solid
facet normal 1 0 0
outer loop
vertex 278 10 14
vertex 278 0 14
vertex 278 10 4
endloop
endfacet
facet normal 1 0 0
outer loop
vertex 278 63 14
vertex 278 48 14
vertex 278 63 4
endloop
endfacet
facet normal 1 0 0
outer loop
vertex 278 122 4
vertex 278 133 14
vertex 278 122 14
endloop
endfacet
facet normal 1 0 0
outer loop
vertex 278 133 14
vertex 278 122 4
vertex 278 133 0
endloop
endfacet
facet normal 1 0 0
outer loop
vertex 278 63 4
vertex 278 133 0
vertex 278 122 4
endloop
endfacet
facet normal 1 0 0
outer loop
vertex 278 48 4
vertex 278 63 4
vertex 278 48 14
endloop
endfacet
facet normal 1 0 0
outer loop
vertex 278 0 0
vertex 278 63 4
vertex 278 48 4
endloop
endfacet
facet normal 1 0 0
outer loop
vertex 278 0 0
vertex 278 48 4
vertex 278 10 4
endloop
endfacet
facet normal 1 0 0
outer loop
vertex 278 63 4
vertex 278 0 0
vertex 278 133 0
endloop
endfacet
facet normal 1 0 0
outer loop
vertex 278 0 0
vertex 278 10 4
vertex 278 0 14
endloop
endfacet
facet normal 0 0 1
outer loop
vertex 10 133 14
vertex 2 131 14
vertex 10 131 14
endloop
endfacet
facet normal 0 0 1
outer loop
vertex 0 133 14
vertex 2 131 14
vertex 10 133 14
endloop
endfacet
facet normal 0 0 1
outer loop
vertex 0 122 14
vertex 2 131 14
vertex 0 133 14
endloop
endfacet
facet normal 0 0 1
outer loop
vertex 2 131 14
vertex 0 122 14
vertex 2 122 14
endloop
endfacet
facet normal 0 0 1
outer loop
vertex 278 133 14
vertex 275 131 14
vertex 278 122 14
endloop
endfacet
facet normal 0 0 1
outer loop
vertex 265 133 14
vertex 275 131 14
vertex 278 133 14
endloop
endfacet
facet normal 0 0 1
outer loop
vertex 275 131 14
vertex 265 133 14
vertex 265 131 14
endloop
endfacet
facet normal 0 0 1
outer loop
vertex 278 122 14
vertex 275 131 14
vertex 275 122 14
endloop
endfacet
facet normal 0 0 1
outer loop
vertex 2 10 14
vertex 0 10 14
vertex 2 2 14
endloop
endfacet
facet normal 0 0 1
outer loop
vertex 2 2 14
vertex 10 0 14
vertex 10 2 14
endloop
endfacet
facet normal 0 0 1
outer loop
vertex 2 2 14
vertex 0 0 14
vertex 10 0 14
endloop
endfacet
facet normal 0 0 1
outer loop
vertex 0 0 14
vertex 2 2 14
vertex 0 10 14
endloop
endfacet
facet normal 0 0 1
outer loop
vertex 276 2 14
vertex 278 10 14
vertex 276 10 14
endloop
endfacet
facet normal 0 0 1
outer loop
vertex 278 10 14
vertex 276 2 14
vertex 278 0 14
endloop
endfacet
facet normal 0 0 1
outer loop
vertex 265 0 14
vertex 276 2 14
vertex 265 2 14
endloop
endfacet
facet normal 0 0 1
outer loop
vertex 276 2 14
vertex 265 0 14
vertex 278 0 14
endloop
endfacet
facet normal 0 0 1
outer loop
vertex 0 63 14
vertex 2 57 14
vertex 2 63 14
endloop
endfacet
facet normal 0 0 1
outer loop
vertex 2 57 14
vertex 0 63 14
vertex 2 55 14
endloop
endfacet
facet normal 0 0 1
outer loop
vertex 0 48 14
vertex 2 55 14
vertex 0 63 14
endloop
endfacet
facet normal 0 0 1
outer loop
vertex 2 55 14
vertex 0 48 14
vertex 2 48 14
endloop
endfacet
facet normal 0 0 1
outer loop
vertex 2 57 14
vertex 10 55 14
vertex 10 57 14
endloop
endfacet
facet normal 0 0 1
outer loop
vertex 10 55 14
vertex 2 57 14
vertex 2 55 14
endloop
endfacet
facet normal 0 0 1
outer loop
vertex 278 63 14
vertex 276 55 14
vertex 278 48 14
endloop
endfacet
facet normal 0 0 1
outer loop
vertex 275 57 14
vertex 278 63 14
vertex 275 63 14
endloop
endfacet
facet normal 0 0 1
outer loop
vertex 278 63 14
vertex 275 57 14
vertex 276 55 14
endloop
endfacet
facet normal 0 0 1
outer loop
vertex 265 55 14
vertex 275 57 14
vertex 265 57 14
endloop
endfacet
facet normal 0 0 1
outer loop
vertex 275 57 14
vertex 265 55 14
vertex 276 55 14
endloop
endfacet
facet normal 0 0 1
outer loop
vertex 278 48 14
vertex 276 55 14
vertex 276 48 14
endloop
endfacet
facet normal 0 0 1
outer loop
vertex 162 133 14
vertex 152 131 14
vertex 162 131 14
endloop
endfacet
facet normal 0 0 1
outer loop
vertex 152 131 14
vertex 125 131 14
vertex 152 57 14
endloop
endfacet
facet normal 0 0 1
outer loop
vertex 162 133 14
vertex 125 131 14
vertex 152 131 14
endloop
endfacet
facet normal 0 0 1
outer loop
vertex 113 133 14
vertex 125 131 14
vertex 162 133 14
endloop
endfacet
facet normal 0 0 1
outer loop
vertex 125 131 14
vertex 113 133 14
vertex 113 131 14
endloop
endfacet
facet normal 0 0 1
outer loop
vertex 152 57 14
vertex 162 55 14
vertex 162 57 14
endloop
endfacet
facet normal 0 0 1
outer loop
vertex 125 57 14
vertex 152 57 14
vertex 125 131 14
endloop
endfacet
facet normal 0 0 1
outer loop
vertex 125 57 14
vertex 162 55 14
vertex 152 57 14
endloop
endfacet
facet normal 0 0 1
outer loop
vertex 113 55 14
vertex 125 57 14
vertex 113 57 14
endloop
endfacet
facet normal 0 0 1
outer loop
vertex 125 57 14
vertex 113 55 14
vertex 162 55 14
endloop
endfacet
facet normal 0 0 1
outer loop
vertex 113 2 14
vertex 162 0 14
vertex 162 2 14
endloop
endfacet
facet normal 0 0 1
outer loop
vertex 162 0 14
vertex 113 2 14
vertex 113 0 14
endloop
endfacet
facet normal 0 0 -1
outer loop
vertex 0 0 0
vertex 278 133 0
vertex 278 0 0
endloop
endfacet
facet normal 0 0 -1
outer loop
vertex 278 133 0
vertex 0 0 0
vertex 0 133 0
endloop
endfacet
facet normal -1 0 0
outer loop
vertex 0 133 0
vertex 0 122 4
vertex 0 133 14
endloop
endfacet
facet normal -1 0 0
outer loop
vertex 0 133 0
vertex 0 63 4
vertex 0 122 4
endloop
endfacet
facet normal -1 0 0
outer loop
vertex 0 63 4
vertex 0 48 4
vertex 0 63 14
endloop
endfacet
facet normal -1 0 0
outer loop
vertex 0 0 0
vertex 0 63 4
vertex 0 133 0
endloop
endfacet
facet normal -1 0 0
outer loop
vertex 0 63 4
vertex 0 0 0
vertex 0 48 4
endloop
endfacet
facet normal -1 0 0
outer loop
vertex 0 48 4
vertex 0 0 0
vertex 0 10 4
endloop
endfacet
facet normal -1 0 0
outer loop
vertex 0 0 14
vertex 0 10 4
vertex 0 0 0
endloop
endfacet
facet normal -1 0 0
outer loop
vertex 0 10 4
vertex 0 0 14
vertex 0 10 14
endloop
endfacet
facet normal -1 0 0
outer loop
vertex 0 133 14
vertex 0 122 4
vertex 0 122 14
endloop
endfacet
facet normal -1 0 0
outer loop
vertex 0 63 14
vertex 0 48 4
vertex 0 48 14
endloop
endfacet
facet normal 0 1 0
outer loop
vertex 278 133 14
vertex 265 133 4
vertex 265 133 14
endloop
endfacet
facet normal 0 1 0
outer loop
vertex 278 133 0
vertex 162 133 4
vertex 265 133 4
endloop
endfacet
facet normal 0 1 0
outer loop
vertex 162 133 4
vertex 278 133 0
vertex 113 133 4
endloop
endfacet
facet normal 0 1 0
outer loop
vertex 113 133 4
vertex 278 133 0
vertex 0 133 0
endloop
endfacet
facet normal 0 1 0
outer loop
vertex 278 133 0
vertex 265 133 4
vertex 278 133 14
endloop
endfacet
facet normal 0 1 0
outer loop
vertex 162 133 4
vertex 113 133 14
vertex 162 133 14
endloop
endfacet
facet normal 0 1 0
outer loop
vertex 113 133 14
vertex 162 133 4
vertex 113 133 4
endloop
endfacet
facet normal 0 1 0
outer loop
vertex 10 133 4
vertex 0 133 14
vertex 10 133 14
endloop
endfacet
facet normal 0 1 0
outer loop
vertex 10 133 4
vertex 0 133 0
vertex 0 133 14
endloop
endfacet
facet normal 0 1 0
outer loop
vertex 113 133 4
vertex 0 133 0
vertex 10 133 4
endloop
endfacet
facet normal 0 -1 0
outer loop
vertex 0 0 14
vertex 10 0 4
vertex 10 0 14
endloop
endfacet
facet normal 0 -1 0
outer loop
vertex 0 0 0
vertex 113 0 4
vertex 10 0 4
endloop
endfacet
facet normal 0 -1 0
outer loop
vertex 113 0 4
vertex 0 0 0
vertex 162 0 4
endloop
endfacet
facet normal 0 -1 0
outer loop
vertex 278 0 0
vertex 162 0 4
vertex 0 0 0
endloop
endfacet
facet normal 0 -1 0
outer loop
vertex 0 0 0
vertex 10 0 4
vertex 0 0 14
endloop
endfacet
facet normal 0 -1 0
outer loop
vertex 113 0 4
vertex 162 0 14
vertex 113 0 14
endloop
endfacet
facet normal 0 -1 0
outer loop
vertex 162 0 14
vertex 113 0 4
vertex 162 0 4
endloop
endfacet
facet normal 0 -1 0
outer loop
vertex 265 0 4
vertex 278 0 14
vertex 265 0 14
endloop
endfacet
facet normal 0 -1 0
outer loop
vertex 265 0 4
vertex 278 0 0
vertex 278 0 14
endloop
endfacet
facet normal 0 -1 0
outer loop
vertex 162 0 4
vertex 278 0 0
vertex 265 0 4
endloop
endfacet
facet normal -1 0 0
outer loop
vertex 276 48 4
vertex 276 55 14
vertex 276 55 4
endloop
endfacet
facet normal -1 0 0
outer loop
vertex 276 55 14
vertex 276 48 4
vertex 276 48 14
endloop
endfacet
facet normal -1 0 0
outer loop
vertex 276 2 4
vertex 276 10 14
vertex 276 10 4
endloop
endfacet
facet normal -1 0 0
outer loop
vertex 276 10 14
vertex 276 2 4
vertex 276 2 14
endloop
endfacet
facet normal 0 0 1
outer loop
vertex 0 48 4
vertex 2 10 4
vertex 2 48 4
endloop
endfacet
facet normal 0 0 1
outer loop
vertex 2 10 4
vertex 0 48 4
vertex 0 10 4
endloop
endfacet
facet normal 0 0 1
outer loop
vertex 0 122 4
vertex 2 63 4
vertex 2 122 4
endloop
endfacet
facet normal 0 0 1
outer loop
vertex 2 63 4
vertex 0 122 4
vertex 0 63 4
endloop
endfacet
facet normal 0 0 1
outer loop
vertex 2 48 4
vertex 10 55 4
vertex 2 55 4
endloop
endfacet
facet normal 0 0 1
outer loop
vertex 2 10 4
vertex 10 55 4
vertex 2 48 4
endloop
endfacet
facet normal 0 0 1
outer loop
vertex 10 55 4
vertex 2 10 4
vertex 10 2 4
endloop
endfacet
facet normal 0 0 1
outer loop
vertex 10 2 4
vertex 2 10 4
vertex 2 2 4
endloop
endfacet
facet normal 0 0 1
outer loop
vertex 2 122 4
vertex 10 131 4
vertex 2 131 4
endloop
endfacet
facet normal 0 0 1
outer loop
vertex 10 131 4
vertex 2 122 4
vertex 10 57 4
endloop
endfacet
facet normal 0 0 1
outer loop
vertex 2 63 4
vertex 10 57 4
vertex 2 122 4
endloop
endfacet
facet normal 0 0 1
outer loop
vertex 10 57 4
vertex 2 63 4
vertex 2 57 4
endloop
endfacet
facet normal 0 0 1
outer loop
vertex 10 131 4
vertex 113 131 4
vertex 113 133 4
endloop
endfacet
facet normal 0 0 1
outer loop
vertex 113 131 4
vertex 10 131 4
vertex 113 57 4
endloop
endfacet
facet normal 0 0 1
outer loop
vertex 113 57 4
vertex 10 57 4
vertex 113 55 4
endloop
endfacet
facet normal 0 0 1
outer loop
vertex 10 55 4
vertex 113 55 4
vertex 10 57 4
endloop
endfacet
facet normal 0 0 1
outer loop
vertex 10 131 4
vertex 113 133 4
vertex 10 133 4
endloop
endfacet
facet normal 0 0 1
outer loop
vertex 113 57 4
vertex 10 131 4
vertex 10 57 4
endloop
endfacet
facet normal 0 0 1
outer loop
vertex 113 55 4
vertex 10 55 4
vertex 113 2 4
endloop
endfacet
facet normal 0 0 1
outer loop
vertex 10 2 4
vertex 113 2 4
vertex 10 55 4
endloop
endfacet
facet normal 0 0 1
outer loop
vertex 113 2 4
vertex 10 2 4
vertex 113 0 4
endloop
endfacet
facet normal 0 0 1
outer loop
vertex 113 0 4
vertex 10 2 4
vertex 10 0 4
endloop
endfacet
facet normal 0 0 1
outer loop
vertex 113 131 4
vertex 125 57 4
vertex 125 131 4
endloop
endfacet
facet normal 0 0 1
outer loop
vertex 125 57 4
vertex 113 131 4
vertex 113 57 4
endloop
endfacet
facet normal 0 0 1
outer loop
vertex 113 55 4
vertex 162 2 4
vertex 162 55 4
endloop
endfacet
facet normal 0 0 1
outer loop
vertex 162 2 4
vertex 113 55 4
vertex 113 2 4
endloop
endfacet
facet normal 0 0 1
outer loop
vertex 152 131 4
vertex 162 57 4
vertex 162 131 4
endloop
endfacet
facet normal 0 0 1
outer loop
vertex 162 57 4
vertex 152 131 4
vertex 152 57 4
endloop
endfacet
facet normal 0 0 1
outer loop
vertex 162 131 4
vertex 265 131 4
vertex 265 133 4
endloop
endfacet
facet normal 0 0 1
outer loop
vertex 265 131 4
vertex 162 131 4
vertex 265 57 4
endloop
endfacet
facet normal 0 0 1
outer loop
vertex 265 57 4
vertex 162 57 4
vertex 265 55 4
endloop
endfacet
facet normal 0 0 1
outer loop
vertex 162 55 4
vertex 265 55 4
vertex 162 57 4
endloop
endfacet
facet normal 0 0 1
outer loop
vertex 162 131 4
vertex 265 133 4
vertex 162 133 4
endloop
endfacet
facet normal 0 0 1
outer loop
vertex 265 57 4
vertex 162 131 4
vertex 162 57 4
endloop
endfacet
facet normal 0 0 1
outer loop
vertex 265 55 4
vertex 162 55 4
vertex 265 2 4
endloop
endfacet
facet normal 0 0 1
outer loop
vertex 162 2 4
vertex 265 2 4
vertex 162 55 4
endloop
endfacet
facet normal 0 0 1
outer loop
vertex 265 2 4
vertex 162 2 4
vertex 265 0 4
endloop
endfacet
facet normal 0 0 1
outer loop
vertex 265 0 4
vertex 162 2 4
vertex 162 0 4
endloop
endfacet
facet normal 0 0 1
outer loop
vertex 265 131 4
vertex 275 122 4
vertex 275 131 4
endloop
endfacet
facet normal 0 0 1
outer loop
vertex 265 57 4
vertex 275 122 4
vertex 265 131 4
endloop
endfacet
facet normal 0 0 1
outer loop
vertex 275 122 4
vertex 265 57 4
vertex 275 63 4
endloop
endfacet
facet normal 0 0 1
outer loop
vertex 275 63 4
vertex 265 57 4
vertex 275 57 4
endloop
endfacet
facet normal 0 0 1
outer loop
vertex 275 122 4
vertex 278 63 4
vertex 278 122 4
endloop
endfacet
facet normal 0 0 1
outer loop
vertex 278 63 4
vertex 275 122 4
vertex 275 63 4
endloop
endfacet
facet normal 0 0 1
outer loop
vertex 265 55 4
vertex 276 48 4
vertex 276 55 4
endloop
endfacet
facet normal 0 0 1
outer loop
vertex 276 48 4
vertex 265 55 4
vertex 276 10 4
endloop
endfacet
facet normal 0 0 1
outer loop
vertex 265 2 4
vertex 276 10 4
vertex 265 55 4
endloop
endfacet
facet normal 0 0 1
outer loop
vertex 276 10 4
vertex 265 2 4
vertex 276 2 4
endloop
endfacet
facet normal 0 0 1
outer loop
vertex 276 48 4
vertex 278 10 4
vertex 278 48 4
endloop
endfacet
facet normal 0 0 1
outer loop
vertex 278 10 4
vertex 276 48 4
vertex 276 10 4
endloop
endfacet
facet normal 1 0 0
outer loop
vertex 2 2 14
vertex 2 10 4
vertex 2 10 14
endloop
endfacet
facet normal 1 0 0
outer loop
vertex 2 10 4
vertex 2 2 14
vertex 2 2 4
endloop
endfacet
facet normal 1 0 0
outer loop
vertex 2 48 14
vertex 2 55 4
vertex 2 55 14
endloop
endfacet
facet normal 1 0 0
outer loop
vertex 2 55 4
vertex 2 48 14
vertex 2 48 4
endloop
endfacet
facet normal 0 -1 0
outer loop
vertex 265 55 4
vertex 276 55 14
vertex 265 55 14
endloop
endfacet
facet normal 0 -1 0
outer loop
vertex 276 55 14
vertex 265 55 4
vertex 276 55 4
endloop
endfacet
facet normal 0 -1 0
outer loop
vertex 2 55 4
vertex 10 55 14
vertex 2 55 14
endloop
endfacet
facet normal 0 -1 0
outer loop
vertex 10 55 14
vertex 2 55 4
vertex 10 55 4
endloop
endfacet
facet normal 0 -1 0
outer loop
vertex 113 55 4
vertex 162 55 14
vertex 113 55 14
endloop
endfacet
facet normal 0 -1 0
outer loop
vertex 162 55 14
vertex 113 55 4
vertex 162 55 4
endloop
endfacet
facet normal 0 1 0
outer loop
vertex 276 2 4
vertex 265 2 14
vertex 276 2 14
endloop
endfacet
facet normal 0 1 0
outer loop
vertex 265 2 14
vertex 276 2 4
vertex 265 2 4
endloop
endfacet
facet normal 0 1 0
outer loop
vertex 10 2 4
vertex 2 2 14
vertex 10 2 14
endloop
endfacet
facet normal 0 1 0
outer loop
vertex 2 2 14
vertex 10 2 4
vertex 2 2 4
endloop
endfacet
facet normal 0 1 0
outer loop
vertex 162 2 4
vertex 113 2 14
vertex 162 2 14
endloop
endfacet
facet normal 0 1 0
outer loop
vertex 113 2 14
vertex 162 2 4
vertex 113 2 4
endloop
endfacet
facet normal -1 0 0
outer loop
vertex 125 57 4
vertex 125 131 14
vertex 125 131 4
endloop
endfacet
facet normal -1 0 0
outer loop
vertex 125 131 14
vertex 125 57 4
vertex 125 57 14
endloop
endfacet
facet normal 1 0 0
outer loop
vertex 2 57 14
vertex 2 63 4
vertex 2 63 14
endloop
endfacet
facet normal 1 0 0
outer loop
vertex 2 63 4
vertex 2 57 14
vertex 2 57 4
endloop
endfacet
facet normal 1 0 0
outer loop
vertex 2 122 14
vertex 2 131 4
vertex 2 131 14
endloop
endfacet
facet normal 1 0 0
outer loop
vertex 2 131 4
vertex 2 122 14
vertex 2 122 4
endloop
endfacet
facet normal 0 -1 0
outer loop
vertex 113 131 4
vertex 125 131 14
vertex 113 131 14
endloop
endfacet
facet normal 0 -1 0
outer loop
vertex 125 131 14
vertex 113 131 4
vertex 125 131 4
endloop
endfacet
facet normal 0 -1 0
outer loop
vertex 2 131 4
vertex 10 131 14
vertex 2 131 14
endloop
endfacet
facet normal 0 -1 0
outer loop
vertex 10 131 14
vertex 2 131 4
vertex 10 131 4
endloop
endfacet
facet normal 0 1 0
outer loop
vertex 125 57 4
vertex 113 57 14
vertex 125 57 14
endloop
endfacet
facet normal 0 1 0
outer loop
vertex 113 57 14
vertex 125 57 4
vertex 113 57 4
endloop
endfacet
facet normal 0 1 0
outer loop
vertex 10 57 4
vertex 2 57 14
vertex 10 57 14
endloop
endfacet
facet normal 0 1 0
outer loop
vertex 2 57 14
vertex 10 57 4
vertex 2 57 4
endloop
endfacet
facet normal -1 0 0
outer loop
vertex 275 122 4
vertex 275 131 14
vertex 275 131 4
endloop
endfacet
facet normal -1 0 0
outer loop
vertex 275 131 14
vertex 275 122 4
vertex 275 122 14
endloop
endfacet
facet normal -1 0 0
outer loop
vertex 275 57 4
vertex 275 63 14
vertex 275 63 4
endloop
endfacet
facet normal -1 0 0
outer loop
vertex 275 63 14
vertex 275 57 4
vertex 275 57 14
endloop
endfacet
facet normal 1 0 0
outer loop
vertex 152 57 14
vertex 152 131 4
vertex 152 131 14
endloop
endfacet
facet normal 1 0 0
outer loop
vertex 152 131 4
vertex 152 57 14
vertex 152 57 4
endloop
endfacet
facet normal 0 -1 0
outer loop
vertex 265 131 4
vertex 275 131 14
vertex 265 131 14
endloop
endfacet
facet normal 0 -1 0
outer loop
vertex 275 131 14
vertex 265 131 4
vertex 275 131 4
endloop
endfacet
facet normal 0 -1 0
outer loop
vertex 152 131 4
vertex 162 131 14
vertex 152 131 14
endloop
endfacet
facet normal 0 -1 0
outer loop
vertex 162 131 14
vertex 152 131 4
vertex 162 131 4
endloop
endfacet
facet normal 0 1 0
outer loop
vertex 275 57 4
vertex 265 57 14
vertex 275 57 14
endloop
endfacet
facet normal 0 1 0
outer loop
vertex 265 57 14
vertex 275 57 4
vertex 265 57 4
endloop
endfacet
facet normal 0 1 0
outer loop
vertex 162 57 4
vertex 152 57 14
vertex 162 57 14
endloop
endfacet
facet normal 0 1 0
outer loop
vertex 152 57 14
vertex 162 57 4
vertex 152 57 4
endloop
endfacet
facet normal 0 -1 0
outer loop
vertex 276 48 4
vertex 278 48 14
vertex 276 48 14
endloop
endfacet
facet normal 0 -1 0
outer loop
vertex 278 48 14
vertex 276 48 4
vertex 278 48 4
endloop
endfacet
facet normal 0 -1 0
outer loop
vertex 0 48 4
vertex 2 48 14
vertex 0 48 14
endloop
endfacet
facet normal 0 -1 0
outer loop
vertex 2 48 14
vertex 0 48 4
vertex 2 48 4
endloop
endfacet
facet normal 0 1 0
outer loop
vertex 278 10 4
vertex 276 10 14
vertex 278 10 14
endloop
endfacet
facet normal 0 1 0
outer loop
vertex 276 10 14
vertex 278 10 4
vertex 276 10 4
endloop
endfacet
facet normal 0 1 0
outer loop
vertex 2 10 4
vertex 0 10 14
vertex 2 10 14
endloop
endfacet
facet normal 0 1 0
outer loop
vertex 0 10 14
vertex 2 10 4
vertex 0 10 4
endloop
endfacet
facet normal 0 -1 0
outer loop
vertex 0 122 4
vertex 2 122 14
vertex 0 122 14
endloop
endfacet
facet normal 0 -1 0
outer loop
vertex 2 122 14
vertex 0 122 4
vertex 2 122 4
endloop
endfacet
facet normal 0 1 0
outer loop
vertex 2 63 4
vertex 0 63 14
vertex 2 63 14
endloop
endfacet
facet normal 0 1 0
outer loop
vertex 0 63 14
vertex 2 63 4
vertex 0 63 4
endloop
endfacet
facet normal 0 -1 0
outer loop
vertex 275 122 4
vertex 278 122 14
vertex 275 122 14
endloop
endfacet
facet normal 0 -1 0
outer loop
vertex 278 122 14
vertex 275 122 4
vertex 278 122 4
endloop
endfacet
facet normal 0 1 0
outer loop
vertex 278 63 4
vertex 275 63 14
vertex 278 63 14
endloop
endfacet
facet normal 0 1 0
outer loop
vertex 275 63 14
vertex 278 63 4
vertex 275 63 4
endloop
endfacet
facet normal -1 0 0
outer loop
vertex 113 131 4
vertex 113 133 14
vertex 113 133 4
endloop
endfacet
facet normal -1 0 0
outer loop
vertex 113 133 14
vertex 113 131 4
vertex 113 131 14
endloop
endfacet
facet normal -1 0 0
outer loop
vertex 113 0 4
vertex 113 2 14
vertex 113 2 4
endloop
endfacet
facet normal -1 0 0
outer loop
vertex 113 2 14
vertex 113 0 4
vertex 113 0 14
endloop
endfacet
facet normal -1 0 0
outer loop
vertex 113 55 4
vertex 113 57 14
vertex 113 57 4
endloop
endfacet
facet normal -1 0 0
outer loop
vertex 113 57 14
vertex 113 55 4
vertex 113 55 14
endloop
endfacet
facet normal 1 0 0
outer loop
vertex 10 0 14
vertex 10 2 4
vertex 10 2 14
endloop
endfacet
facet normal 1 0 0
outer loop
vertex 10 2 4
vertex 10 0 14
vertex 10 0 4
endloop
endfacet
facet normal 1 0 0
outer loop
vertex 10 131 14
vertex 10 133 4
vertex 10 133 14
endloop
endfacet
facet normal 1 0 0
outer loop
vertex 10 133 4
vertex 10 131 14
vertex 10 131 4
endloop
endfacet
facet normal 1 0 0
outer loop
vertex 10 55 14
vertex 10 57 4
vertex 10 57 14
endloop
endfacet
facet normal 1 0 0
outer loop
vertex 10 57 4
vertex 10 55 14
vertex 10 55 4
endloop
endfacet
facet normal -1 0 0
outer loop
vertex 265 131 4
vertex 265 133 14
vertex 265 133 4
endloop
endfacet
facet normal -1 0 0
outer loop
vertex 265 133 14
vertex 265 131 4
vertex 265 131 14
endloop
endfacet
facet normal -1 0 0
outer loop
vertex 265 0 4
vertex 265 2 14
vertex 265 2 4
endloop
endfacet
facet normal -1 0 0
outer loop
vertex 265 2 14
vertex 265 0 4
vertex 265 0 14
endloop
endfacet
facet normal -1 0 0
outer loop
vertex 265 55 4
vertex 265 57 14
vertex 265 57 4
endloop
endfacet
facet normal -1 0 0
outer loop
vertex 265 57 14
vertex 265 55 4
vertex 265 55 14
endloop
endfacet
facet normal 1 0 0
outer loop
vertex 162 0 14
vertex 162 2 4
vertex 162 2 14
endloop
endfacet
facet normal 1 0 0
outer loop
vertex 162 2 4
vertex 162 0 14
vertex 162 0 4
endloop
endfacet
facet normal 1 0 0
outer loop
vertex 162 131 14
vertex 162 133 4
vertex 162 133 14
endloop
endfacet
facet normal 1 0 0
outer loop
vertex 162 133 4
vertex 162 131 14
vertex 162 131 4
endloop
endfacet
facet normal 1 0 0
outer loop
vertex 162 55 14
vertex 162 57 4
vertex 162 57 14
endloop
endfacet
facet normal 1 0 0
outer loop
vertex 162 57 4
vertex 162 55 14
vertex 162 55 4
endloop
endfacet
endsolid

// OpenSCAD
//$fn=360;
//67x93x22
x=278;
y=133;
z=14;
zparts=4;
struggletrackerx=274;
struggletrackery=53;
struggletrackerz=2;
struggleobjectivex=123;
struggleobjectivey=74;
difference() {
  translate([0,0,0])
  cube([x,y,z]);
  translate([2,2,zparts])
  cube([struggletrackerx,struggletrackery,z]);
  translate([2,struggletrackery+4,zparts])
  cube([struggleobjectivex,struggleobjectivey,z]);
  translate([struggletrackerx/2+15,struggletrackery+4,zparts])
  cube([struggleobjectivex,struggleobjectivey,z]);
  translate([0,10,zparts])
  cube([x,struggletrackery-15,z]);
  translate([0,struggletrackery+10,zparts])
  cube([struggleobjectivex,struggleobjectivey-15,z]);
  translate([struggleobjectivex+40,struggletrackery+10,zparts])
  cube([struggleobjectivex,struggleobjectivey-15,z]);
  translate([10,0,zparts])
  cube([struggleobjectivex-20,y,z]);
  translate([struggletrackerx/2+25,0,zparts])
  cube([struggleobjectivex-20,y,z]);
}
